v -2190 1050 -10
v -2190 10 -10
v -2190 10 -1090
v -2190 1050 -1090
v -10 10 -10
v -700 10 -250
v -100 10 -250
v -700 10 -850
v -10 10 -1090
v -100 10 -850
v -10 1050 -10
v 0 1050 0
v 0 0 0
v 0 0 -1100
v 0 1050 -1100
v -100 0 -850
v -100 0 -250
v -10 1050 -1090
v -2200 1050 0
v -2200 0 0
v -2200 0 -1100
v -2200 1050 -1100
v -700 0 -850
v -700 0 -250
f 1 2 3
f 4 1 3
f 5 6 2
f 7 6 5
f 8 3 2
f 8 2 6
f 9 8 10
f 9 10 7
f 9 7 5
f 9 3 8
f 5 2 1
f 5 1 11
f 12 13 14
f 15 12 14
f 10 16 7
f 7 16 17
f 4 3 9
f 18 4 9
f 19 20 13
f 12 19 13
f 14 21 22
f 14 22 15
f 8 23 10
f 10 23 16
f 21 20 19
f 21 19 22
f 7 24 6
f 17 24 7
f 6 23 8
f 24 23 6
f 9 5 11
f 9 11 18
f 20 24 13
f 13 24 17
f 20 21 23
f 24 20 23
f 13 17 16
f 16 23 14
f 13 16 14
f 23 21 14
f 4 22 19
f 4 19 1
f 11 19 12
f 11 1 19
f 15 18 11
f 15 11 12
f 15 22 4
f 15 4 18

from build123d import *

# Parameters (mm, degrees)
SKETCH1_W          = 2200
SKETCH1_H          = 1100
EXTRUDE1_DEPTH     = 1050
SHELL1_T           = -10
SKETCH2_W          = 600
SKETCH2_H          = 600
CUT_EXTRUDE1_DEPTH = 400


with BuildPart() as part:
    # Sketch1 → Extrude1 (new body)
    with BuildSketch(Plane(origin=(0, 0, 0), x_dir=(1, 0, 0), z_dir=(0, 1, 0))):
        with Locations((-1100, 550)):
            Rectangle(SKETCH1_W, SKETCH1_H)
    extrude(amount=EXTRUDE1_DEPTH)

    # Shell1
    shell1_openings = [part.faces().sort_by_distance(p)[0] for p in [
        (-1100, 1050, -550),
    ]]
    offset(amount=SHELL1_T, openings=shell1_openings, kind=Kind.INTERSECTION)

    # Sketch2 → Cut-Extrude1 (cut)
    with BuildSketch(Plane.XZ):
        with Locations((-400, -550)):
            Rectangle(SKETCH2_W, SKETCH2_H)
    extrude(amount=-CUT_EXTRUDE1_DEPTH, mode=Mode.SUBTRACT)


solid = part.part
